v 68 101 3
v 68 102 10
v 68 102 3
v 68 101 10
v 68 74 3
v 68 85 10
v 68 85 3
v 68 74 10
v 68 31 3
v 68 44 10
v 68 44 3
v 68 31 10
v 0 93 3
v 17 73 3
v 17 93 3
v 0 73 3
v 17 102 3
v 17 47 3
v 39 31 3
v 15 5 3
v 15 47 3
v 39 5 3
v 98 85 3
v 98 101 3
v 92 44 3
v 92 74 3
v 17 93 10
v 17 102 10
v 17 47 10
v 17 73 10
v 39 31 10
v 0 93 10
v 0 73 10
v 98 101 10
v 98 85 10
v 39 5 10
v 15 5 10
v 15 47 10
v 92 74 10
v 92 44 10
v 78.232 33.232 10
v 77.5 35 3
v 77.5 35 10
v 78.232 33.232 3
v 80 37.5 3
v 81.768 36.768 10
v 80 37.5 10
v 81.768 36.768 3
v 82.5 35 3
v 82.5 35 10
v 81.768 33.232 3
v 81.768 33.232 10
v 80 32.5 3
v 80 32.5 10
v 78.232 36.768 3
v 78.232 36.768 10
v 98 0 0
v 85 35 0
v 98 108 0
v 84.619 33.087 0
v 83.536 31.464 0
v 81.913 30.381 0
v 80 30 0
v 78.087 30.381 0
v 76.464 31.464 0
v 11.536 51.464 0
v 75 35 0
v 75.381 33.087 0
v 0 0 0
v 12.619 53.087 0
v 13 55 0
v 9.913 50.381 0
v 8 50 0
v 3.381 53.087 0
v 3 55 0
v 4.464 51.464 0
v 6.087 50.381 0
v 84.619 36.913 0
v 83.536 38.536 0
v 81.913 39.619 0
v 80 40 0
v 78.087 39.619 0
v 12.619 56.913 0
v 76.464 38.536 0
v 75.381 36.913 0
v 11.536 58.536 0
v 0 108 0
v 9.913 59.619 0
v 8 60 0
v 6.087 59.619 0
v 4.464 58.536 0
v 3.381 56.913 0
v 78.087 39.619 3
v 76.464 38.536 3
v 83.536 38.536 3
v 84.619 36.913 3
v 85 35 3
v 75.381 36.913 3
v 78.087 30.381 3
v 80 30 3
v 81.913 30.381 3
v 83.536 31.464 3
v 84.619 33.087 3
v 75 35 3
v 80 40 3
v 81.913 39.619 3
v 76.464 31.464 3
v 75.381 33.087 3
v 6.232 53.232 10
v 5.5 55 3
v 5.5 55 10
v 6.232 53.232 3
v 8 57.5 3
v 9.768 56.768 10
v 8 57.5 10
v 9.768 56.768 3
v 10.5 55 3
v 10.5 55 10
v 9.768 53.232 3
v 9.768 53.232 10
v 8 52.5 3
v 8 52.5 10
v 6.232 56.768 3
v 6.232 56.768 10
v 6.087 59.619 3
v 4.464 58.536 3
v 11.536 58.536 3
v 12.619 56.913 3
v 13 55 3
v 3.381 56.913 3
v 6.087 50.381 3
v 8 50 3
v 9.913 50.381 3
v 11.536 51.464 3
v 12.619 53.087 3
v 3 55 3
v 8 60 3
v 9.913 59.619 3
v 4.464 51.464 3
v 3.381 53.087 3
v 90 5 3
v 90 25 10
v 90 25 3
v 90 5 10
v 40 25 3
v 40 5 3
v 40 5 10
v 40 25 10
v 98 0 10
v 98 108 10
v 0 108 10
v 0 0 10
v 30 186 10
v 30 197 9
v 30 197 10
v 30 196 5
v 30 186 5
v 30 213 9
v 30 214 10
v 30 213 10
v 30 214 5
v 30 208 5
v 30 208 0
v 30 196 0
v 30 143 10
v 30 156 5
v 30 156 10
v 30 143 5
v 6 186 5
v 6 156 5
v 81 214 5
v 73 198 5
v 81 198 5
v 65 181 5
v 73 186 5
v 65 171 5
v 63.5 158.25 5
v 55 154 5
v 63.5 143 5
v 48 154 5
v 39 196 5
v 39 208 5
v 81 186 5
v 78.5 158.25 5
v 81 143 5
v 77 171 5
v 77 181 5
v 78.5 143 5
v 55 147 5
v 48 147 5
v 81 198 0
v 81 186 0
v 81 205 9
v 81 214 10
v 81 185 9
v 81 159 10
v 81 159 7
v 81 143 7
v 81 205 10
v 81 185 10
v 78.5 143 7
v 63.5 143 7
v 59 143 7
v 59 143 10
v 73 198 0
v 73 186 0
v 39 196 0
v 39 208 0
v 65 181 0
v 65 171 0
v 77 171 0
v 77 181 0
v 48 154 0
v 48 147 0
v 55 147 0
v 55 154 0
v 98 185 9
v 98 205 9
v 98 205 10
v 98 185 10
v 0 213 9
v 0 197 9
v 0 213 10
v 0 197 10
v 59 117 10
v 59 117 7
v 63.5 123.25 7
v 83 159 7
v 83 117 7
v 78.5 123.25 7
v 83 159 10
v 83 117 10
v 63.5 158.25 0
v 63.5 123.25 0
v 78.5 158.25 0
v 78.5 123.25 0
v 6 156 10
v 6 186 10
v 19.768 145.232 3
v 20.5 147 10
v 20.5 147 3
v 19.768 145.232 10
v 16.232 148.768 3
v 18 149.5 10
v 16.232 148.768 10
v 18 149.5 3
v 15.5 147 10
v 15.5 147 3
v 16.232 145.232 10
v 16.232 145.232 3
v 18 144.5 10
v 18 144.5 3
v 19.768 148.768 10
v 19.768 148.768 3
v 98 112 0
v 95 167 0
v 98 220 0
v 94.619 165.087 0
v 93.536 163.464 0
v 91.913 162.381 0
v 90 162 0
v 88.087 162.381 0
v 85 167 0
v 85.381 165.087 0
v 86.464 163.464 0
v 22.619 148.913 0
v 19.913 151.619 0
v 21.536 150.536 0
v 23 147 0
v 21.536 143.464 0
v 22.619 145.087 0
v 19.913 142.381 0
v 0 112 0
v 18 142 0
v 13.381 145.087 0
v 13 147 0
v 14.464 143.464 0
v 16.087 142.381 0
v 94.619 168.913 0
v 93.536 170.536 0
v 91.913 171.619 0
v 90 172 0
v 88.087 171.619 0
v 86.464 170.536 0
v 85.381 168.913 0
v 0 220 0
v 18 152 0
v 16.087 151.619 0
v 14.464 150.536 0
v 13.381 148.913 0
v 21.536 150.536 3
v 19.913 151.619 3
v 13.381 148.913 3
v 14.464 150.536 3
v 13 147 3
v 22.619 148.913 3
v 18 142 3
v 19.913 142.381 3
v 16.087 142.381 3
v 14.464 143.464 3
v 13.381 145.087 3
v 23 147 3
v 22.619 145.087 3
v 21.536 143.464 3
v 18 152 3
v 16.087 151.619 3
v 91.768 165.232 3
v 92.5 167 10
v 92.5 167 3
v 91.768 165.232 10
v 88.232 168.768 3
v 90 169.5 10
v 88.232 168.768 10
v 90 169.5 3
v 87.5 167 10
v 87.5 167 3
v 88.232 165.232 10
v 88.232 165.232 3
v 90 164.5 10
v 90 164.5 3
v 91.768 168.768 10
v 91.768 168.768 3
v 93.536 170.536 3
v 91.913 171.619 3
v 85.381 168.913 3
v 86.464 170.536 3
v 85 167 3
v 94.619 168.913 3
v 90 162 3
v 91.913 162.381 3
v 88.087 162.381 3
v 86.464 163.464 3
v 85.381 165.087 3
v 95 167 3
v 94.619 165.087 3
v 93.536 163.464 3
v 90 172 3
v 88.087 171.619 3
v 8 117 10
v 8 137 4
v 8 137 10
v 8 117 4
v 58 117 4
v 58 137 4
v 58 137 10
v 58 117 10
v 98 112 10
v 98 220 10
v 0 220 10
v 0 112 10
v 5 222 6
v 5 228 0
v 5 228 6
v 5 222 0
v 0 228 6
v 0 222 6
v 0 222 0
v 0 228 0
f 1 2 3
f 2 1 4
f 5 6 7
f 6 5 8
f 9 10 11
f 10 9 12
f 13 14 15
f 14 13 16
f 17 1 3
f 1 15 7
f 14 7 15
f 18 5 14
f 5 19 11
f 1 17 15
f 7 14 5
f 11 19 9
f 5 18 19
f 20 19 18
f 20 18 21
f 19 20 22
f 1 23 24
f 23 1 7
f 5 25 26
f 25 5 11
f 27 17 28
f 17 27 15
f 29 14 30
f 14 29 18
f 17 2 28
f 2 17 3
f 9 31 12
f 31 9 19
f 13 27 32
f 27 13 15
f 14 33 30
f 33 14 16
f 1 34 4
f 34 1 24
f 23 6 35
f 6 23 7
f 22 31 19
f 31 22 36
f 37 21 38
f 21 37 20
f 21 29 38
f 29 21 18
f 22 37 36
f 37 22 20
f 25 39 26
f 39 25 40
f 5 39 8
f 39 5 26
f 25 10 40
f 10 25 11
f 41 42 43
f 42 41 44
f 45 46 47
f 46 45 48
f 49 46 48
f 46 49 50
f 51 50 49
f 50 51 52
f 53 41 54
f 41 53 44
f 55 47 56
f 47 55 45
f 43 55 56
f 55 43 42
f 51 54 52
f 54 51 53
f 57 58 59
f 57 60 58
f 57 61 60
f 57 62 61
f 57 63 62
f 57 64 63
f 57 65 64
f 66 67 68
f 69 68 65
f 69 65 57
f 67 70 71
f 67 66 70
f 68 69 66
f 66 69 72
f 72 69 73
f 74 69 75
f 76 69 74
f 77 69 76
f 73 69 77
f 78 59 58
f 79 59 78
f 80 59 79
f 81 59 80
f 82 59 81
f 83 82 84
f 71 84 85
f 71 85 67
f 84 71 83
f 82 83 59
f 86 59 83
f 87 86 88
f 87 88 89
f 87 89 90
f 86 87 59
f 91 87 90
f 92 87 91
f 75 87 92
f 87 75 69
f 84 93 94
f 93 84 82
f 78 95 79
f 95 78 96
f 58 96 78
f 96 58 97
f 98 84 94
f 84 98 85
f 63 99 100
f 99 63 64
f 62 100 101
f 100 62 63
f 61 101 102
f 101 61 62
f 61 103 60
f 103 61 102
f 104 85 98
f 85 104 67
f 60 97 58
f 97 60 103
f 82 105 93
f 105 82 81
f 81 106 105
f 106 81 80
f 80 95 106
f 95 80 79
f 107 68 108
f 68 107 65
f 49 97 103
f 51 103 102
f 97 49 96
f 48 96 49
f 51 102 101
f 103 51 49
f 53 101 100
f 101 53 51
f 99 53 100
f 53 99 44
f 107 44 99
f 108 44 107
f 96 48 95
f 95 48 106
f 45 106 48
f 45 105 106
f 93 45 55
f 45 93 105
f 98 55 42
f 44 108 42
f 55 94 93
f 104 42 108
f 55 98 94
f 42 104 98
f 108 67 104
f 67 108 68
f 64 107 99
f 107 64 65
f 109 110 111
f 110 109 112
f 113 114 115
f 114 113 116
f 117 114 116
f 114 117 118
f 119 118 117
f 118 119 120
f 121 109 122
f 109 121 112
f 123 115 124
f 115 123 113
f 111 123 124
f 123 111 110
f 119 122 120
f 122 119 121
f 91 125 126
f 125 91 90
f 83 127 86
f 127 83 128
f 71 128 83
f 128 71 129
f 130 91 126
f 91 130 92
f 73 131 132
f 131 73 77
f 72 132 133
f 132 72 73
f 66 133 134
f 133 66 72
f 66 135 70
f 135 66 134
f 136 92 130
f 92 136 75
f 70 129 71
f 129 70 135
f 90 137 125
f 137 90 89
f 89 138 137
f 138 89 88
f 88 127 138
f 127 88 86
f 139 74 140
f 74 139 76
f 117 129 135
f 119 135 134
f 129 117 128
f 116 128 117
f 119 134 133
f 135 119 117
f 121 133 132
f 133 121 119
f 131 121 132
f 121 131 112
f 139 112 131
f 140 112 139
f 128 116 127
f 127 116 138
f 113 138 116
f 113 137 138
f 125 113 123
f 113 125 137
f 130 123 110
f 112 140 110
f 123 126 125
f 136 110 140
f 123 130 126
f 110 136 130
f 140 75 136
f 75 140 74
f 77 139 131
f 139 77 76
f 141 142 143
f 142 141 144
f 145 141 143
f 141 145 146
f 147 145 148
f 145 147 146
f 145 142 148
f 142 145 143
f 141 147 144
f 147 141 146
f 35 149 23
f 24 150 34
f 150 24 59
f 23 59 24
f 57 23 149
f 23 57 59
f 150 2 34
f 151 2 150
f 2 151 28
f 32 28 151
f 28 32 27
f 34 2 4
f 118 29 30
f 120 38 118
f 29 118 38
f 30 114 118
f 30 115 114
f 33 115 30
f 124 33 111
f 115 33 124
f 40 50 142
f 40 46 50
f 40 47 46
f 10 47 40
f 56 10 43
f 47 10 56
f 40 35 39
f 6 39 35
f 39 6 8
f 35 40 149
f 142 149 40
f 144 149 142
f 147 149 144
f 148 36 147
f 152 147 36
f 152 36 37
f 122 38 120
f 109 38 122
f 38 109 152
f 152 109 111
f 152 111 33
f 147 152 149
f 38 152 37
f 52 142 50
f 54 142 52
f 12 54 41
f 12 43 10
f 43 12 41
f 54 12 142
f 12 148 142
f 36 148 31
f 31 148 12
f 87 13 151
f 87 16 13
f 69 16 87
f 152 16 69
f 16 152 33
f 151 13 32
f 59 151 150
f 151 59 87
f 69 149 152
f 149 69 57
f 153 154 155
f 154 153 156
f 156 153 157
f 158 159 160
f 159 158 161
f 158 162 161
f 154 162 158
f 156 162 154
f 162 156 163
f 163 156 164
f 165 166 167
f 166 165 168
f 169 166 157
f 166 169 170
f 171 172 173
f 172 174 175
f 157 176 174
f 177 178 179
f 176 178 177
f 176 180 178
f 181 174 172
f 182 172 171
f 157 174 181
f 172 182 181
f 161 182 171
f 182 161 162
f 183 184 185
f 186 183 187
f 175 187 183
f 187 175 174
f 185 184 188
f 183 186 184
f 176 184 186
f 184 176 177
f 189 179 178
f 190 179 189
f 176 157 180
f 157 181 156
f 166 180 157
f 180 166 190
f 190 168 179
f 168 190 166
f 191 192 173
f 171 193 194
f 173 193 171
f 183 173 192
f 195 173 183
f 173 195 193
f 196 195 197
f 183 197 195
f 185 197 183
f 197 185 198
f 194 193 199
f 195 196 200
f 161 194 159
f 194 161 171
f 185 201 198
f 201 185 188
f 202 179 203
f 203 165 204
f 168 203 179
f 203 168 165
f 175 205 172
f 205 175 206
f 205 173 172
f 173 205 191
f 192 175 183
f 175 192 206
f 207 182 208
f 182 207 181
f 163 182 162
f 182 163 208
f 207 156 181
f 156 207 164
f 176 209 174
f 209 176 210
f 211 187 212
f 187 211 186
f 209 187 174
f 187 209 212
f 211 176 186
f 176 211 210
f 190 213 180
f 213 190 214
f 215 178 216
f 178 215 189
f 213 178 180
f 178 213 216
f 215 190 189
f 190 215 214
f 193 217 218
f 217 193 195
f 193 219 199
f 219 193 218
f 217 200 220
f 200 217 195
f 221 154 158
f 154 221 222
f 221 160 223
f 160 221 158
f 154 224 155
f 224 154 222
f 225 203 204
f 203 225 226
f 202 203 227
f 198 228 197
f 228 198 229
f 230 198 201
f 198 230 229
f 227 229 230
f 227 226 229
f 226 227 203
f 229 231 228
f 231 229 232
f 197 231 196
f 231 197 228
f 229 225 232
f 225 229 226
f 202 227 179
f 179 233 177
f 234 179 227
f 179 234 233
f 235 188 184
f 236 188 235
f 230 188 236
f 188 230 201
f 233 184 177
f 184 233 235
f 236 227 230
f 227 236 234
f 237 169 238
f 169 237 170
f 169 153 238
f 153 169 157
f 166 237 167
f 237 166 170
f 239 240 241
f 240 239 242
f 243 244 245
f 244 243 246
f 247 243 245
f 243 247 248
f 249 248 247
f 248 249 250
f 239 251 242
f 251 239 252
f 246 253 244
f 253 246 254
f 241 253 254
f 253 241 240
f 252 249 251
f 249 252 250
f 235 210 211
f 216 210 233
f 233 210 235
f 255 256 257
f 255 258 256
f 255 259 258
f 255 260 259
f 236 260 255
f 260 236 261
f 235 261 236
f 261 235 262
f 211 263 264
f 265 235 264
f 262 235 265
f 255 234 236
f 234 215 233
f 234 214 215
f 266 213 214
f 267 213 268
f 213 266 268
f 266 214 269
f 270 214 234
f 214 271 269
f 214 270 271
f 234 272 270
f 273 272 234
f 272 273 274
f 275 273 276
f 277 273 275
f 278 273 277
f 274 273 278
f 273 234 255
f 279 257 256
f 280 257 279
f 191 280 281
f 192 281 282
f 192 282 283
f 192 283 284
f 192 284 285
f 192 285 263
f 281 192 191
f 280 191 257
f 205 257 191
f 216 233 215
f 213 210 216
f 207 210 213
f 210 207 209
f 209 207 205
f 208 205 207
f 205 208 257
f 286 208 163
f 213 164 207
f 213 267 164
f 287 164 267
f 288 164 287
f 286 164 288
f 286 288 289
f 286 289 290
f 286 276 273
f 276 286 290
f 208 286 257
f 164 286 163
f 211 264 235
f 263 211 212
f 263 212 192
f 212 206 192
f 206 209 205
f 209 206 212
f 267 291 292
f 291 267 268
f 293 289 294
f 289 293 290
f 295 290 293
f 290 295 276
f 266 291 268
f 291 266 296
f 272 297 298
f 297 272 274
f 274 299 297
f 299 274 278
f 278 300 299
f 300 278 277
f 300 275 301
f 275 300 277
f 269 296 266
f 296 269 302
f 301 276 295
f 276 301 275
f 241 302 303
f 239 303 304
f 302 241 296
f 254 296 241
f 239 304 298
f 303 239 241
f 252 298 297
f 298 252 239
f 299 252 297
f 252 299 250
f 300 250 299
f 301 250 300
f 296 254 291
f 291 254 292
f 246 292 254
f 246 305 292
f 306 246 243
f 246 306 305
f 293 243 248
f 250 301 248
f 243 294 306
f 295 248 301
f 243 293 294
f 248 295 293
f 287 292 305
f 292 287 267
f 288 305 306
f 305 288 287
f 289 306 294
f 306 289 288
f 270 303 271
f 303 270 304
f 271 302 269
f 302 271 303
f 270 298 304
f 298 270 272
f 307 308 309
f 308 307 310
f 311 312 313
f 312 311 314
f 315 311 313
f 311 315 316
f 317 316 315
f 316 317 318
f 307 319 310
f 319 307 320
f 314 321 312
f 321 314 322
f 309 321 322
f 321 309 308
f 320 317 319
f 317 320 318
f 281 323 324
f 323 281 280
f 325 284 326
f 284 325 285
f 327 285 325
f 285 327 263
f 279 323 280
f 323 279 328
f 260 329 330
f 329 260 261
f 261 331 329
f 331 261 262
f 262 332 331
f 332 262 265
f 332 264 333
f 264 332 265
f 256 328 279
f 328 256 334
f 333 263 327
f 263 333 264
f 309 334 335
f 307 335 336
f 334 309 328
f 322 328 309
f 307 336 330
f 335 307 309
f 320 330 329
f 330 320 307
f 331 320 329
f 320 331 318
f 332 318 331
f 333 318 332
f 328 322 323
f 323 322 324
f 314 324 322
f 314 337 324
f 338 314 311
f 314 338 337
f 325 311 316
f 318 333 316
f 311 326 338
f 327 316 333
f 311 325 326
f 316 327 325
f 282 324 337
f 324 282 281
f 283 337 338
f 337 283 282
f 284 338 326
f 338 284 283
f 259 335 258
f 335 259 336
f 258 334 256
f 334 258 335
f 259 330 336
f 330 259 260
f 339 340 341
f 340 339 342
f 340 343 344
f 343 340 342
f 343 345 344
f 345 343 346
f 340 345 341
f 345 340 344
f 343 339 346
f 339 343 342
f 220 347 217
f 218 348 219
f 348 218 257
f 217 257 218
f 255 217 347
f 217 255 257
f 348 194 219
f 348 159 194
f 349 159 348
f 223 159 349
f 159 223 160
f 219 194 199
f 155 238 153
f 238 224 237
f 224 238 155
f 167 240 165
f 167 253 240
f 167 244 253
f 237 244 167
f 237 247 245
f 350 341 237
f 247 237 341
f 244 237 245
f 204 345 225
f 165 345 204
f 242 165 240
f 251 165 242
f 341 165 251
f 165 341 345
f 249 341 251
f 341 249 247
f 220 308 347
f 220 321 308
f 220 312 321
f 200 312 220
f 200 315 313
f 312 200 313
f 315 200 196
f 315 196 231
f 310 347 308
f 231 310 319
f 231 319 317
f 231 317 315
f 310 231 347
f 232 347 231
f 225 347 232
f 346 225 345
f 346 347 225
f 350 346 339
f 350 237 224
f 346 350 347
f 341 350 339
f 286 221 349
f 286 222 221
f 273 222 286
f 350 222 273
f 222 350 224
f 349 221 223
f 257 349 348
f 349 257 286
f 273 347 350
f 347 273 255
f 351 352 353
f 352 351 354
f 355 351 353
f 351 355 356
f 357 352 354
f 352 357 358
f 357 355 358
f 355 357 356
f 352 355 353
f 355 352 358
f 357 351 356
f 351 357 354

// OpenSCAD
module Display() {
    cube([24, 42, 10]);
    translate([4.5, 6.25, 0]) {
        cube([15, 35, 20]);
    }
}

module RTC() {
    cube([30, 30, 12]);    
}

module Board() {
    union() {
        cube([51, 71, 12]);
        
        /* Transistor. */
        translate([0, 43, 0]) {
            cube([8, 12, 25]);
        }
        
        /* Power reg. */
        translate([42, 53, 0]) {
            cube([9, 12, 25]);
        }
        
        /* Crystal. */
        translate([4, 28, 0]) {
            cube([12, 10, 20]);
        }
        
        /* Button. */
        translate([26, 4, 0]) {
            cube([7, 7, 100]);
        }
        
        /* Led path. */
        translate([-100, 42, 0]) {
            cube([100, 20, 8]);
        }  
        
        /* Power path. */
        translate([50, 54, 0]) {
            cube([100, 16, 8]);
        }
    }
}

module Elec() {
    union() {
        translate([2, 26, 0]) {
            Board();
        }
        
        translate([2+45, 26+13, 0]) {
            RTC();
        }
        
        Display();
    }
}

module Internal() {
    translate([15, 5, 3]) {
        Elec();
    }
    
    /* Cut out to save on material. */
    translate([40, 5, 3]) {
        cube([50, 20, 13]);
    }
    
    /* Bolts */
    translate([80, 35, 0]) union() {
        cylinder(r=2.5, h=20);
        cylinder(r=5, h=3);
        translate([0, 0, 17]) {
            cylinder(r=5, h=3);
        }
    }
    
    translate([8, 55, 0]) union() {
        cylinder(r=2.5, h=20);
        cylinder(r=5, h=3);
        translate([0, 0, 17]) {
            cylinder(r=5, h=3);
        }
    }  
}

/* Bottom. */
difference() {
    cube([98, 108, 10]);
    Internal();
}

/* Top. */
translate([0, 112, 0]) difference() {
    cube([98, 108, 10]);
    rotate([0, 180, 0]) 
        translate([-98, 0, -20])
        Internal();
}

/* Button. */
translate([0, 222, 0])
    cube([5, 6, 6]);
